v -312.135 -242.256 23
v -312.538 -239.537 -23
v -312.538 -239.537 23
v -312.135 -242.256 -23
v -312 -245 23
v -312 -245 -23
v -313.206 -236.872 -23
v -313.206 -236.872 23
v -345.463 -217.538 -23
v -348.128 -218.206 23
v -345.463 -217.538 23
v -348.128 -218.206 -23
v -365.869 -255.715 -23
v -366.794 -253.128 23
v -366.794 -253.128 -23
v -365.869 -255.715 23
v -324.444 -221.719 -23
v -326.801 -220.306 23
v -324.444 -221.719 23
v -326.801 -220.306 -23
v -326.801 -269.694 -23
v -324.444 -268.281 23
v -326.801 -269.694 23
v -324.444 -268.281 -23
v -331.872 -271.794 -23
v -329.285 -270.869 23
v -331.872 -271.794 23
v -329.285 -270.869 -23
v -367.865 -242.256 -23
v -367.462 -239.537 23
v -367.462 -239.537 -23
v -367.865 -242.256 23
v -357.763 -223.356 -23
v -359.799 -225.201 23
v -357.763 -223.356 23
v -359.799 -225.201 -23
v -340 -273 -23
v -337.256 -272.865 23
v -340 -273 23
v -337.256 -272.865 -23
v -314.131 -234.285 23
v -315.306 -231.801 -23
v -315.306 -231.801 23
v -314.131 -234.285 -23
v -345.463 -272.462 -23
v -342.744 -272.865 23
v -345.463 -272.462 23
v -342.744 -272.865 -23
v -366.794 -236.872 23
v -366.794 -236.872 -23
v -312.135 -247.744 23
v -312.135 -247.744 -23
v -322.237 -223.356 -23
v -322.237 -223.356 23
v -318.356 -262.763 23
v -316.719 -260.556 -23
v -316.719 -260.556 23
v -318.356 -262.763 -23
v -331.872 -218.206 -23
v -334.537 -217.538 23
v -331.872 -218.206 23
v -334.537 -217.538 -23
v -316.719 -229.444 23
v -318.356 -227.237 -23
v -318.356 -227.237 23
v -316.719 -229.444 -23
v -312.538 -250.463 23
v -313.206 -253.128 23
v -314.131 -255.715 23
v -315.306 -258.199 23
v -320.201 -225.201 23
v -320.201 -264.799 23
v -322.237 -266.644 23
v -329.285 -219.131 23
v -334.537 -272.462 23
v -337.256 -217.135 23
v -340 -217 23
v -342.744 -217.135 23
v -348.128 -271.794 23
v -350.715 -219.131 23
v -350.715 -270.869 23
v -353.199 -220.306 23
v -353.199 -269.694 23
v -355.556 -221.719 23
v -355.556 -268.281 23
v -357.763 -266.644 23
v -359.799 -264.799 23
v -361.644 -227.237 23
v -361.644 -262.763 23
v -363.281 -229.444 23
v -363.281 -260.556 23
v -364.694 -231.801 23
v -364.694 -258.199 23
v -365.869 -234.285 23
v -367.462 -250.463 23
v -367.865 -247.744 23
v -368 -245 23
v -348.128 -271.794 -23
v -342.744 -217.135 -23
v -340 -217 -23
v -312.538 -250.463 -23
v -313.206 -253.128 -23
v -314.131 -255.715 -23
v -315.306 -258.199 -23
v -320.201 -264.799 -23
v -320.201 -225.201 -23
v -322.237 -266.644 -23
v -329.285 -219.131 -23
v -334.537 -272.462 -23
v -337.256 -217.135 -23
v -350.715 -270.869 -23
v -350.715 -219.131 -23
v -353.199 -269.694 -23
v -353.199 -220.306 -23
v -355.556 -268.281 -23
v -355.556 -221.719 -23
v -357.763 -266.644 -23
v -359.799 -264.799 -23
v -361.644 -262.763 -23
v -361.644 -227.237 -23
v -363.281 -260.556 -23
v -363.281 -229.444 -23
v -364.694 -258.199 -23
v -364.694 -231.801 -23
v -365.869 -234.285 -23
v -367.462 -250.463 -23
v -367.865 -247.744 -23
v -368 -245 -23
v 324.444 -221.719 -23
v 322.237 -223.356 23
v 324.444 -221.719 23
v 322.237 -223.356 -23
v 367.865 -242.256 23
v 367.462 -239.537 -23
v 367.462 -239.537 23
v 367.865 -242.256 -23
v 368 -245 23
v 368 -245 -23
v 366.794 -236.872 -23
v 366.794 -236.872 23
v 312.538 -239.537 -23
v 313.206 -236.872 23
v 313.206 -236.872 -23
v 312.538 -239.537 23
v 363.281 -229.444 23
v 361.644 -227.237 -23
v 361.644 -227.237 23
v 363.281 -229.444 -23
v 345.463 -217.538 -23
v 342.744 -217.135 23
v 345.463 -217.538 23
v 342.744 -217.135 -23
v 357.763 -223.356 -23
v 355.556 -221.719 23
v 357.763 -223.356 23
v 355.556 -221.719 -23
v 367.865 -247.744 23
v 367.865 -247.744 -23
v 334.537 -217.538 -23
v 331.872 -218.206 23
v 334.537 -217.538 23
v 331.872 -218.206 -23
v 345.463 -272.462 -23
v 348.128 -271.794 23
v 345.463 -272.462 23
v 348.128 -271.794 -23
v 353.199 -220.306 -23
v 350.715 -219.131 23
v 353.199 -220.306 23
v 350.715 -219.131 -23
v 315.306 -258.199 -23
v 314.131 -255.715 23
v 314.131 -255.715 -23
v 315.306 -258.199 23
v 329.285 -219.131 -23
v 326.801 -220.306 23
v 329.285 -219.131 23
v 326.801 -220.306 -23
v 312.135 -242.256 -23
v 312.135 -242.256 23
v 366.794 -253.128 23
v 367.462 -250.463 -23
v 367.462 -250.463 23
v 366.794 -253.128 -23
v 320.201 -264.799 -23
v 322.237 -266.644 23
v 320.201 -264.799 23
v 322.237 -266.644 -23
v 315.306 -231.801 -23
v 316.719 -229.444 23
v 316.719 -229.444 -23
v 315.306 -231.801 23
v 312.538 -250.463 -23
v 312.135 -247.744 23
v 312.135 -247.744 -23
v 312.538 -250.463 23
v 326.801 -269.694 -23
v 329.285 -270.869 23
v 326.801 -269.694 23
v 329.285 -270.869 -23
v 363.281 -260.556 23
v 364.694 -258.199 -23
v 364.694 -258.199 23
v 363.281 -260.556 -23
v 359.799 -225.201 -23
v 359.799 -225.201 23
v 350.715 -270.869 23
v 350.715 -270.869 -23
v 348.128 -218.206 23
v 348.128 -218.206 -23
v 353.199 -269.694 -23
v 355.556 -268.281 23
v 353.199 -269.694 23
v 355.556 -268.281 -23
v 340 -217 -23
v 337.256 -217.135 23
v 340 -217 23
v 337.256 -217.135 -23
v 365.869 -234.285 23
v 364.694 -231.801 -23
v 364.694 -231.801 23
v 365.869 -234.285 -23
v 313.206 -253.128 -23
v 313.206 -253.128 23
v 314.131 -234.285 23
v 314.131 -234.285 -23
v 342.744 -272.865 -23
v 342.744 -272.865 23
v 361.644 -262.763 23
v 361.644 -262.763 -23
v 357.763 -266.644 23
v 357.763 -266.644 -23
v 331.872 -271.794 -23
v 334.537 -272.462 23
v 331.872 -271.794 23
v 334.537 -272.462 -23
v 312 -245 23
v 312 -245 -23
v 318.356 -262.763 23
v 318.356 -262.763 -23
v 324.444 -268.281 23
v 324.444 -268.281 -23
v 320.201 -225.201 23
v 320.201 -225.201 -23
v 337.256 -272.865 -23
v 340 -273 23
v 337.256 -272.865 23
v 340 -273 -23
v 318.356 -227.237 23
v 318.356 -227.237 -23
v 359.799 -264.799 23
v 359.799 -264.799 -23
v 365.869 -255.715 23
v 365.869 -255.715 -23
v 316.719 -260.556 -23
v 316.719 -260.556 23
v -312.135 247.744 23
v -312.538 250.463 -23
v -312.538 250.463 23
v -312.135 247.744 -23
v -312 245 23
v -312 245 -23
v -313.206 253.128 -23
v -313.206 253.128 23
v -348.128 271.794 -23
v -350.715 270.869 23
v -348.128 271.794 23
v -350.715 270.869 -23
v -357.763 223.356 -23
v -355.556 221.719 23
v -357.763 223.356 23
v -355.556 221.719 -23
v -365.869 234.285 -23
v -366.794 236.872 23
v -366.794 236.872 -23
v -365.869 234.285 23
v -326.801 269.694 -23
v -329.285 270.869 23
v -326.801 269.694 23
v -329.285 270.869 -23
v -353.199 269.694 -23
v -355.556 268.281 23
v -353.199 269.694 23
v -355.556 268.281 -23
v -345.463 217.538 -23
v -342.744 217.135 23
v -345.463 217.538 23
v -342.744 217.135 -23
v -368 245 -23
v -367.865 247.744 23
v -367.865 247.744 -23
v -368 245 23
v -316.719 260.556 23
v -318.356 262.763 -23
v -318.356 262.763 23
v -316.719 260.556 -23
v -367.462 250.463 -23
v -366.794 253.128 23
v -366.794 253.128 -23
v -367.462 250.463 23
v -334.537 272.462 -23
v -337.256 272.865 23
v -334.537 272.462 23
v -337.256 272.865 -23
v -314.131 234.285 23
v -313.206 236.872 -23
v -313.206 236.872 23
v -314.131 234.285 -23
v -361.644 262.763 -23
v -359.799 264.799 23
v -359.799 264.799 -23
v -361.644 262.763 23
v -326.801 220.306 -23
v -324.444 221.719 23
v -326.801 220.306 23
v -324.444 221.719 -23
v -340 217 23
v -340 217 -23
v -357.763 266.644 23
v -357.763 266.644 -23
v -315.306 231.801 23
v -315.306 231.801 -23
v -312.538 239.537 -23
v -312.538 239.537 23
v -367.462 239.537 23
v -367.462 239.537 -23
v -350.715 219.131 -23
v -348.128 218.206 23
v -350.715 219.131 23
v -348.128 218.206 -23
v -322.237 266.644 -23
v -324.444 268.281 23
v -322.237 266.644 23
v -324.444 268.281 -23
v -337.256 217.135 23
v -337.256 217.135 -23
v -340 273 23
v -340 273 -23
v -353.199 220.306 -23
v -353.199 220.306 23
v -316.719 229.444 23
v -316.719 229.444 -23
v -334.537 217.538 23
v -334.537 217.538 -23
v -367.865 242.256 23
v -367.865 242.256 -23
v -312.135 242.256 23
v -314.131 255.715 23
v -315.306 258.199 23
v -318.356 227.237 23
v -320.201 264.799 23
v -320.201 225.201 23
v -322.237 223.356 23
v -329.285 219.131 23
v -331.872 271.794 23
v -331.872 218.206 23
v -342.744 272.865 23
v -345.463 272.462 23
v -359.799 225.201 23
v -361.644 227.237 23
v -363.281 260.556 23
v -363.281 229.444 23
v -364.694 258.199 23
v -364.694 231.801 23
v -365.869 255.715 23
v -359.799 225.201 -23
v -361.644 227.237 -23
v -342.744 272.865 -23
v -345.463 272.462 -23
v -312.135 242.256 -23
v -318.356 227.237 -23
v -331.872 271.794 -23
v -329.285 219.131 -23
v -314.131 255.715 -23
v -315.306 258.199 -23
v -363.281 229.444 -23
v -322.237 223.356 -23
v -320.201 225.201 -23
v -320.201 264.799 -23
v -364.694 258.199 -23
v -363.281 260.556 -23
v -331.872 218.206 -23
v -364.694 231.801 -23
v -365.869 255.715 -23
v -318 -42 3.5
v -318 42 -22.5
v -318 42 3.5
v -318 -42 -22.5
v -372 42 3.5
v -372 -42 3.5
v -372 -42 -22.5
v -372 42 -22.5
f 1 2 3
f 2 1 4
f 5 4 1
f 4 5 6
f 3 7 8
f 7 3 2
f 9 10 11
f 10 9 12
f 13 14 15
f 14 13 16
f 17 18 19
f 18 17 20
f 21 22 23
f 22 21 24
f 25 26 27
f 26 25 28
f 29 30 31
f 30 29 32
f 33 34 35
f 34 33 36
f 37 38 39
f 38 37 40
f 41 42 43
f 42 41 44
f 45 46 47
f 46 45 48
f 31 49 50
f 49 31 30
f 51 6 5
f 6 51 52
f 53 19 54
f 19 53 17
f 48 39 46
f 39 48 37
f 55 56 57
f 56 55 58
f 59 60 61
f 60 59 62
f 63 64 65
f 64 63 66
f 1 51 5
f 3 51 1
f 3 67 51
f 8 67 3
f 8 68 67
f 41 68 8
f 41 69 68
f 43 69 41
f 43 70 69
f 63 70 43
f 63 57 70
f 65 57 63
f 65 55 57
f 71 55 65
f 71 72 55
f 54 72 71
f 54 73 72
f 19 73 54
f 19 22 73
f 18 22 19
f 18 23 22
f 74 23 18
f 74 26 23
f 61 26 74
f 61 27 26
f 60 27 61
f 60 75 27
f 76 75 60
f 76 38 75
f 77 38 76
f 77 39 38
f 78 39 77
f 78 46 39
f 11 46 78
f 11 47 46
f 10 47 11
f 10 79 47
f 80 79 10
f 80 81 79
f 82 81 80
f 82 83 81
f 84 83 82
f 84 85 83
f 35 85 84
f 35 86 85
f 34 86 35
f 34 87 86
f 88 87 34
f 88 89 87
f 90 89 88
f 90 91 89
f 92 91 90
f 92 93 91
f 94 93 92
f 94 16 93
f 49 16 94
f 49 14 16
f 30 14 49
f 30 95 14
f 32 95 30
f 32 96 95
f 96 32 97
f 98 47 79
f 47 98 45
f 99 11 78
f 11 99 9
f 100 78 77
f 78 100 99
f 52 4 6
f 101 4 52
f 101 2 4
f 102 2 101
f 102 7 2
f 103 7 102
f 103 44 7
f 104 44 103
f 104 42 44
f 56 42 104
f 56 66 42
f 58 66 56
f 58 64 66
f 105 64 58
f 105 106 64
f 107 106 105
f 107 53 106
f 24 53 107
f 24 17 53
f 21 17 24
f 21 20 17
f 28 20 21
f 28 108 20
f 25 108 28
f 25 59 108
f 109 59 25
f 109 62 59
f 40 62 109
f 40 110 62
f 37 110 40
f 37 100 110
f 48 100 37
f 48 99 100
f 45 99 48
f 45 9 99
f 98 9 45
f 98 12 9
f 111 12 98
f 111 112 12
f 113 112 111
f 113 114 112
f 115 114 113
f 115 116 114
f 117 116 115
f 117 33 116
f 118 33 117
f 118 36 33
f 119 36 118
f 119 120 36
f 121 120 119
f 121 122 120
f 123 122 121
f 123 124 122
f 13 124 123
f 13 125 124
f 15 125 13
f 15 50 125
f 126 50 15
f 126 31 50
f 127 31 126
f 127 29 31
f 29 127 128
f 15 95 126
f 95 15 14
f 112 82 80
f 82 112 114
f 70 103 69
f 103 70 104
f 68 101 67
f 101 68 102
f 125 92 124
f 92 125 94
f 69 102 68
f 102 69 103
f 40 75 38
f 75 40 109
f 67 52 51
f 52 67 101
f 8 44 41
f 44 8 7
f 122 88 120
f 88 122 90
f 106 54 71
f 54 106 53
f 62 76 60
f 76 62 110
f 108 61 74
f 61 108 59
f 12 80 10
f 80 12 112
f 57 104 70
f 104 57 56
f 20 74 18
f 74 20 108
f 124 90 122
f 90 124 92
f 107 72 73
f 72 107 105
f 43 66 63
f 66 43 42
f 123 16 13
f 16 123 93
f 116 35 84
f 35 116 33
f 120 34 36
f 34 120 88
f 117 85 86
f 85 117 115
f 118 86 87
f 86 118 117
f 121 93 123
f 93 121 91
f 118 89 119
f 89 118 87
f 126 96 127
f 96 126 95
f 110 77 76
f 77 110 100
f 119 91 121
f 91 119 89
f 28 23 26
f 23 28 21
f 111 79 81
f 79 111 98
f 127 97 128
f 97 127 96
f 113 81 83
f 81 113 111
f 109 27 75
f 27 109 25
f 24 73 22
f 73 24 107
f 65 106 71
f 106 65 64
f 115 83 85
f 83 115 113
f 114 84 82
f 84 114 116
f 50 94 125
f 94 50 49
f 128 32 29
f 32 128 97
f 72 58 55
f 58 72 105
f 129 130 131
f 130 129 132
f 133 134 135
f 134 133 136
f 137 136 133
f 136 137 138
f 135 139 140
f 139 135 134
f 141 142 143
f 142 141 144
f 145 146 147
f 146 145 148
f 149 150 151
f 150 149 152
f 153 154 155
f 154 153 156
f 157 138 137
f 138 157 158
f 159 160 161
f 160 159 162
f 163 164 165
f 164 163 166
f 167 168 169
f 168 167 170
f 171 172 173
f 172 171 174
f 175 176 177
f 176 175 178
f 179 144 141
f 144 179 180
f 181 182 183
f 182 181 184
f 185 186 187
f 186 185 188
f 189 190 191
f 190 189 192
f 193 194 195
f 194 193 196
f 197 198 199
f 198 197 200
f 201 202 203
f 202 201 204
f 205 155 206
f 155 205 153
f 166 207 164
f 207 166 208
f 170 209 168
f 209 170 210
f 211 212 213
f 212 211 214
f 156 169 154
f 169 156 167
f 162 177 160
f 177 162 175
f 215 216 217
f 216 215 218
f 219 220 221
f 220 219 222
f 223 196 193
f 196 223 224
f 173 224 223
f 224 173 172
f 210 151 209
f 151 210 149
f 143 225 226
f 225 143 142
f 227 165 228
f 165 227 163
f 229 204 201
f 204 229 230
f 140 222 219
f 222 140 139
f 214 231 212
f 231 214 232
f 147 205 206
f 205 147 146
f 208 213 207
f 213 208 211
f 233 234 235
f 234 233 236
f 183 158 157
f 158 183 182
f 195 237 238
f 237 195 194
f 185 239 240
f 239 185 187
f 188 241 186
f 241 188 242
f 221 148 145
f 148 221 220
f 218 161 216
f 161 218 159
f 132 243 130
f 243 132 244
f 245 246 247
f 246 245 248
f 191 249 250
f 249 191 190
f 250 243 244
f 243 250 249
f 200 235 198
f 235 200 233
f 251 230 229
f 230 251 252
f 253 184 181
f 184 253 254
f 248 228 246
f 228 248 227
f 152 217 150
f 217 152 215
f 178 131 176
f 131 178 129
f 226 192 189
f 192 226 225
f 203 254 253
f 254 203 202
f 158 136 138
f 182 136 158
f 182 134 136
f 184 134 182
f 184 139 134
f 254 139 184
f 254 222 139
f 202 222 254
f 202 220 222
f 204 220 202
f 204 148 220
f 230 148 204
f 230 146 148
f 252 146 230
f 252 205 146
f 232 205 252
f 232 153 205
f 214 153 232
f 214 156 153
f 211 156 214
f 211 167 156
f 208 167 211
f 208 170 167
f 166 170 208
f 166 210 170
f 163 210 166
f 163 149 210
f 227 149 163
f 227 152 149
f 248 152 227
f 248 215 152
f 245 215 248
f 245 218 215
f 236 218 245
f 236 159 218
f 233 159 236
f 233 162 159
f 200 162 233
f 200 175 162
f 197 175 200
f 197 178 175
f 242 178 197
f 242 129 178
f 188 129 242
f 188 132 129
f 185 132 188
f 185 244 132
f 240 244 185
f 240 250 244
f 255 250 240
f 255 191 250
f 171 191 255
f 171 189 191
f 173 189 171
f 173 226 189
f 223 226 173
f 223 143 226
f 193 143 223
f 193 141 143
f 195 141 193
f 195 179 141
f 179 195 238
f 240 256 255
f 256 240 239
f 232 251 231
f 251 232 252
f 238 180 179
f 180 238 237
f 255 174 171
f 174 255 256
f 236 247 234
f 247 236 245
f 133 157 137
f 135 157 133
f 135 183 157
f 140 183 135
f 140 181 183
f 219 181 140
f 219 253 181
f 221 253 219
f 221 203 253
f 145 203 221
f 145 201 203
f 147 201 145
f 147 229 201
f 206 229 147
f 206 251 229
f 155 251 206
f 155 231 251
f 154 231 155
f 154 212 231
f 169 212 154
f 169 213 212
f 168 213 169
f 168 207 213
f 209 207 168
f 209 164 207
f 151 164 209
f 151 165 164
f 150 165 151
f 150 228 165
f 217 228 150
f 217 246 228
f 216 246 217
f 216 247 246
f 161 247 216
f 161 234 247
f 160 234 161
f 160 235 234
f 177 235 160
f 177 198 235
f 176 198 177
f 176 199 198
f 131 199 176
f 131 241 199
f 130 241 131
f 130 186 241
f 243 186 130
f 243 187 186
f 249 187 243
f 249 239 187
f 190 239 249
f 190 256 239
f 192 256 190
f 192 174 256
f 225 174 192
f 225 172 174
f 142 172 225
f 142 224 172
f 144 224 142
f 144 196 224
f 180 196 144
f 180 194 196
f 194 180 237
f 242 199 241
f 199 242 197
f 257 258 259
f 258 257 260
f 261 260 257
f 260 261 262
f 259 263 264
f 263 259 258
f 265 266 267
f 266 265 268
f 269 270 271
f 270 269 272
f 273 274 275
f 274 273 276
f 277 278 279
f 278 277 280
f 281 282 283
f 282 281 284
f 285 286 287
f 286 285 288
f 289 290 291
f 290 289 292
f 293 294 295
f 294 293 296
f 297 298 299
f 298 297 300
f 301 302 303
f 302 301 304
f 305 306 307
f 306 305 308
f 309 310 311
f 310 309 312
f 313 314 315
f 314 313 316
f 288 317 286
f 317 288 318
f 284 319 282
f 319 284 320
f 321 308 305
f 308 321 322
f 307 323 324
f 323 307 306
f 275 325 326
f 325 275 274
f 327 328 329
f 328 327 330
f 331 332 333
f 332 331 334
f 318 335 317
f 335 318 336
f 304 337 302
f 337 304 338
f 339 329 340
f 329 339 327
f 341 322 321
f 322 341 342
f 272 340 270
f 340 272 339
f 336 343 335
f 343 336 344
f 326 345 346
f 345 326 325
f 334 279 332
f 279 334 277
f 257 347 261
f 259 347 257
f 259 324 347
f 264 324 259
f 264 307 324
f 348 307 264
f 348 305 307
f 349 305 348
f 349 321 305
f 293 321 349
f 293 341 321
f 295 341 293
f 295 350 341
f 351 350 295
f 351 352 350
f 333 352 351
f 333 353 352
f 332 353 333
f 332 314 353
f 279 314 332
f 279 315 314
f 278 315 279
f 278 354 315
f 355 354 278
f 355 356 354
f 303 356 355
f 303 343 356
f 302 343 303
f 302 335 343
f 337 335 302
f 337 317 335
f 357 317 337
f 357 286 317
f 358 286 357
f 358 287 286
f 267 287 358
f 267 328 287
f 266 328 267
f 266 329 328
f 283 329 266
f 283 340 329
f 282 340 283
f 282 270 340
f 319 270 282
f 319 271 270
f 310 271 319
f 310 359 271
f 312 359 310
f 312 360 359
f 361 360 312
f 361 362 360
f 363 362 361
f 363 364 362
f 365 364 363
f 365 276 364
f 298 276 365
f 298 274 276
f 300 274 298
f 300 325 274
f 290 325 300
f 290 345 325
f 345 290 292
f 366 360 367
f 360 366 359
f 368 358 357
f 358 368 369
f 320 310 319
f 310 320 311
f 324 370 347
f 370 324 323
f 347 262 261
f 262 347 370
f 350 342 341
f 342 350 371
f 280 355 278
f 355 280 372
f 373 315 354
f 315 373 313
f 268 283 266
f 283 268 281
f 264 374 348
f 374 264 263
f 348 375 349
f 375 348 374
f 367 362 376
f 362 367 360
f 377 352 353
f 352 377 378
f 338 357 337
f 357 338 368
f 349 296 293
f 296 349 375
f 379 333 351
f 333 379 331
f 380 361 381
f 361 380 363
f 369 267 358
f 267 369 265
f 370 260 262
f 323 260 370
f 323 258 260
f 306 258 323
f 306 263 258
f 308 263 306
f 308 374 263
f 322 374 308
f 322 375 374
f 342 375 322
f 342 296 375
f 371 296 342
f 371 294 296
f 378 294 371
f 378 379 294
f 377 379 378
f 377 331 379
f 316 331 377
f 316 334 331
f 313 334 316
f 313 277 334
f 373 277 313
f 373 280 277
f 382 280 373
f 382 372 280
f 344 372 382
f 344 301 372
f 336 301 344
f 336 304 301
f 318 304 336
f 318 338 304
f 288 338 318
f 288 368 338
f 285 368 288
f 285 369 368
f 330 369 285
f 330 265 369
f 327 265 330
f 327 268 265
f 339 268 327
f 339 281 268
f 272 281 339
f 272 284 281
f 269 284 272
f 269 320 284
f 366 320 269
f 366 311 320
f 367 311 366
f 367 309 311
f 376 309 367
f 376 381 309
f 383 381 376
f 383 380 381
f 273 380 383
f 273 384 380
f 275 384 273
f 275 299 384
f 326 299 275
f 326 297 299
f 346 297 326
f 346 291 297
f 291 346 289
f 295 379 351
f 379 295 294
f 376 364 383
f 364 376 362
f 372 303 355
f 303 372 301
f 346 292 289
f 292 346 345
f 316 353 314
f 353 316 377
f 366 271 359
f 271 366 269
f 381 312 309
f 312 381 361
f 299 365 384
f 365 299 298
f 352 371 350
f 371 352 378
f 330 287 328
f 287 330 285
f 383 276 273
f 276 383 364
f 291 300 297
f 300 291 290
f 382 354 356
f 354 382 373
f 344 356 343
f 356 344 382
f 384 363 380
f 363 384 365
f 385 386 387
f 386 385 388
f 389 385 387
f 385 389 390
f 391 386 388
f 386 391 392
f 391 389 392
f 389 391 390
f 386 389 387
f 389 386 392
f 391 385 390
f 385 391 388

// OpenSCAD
// ============================================================================
// Atom Lithography Machine — Parametric OpenSCAD Module (S4.2-02)
// ============================================================================
// part_id           : S4.2-02
// parent_bom_id     : S4.2
// subsystem         : S4
// part_name         : Cok-eksenli dusuk gurultulu jeofon / ivmeolcer sensor paketi
// material          : Al 6061
// temp_stage        : 300 K
// vacuum_grade      : Atmosfer
// tolerance         : ±2% hassasiyet
// computed_mass_kg  : 1.25645
// envelope_mm       : 742.000 x 550.000 x 46.000
// design_maturity   : M0_M1_DETAILED_CAD_DESIGN_ONLY
// no_lab_measurement: true
// iec61508_certified: false
// semi_s2_certified : false
// Units: millimeters (mm)
// ============================================================================

$fn = 64;

// Nominal bounding envelope parameters (mm)
bbox_x = 742.0000;
bbox_y = 550.0000;
bbox_z = 46.0000;

// Part-specific parametric dimensions
n_geophone_pods = 3;
pod_od_mm = 60.0;
pod_h_mm = 46.0;
resonant_freq_hz = 4.5;

// Interface / port parameters (mm)
port_table_sensor_mount_od = 60.000;

module part_S4_2_02() {
  union() {
    // 3-axis 4.5 Hz seismic geophone pod #1
    translate([-340.000, -245.000, 0.000]) cylinder(d=56.000, h=46.000, center=true);
    // 3-axis 4.5 Hz seismic geophone pod #2
    translate([340.000, -245.000, 0.000]) cylinder(d=56.000, h=46.000, center=true);
    // 3-axis 4.5 Hz seismic geophone pod #3
    translate([-340.000, 245.000, 0.000]) cylinder(d=56.000, h=46.000, center=true);
    // Low-noise triaxial geophone junction box
    translate([-345.000, 0.000, -9.500]) cube([54.000, 84.000, 26.000], center=true);
  }
}

// World assembly mounting transform (global machine frame, mm / deg):
// translate([0.000, 0.000, -216.000]) rotate([0.000, 0.000, 0.000]) part_S4_2_02();

part_S4_2_02();
